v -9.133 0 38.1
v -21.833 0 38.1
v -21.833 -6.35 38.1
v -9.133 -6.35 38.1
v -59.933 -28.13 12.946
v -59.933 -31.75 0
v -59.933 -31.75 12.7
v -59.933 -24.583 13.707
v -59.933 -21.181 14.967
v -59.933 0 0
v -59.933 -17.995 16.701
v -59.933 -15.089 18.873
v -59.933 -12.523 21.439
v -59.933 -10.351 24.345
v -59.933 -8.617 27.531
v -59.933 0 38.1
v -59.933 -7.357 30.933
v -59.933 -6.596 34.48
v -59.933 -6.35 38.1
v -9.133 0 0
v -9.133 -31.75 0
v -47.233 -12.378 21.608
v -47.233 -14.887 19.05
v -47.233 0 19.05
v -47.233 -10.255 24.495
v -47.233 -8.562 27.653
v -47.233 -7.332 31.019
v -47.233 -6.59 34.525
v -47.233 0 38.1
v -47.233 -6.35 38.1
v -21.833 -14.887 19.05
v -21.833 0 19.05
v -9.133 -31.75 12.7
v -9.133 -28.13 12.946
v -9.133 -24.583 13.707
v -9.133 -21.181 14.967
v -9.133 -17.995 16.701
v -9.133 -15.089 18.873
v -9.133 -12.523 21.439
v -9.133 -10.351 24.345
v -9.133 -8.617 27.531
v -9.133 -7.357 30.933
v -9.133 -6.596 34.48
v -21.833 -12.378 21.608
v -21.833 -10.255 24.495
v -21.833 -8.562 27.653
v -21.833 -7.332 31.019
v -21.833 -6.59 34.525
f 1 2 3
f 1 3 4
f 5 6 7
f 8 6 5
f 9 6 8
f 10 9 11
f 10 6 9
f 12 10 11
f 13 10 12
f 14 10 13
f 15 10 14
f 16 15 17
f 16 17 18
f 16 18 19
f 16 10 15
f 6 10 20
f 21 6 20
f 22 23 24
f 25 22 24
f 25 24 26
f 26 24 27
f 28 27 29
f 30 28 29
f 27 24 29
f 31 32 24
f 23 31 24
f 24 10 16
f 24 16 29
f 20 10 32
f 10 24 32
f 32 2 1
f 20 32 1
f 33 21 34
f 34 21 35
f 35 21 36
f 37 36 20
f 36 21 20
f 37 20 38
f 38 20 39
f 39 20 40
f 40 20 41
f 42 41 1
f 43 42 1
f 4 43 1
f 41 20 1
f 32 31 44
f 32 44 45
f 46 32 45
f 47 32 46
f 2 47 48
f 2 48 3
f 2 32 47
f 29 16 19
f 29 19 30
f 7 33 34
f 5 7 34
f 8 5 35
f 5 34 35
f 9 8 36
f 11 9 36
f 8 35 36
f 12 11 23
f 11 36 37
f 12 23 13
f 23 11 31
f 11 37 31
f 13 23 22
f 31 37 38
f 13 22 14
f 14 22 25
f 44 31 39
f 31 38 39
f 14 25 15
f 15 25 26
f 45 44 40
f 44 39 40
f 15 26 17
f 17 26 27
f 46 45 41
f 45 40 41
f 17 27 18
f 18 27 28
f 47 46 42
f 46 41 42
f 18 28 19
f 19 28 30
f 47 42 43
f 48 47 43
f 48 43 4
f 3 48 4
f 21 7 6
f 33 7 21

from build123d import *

# Parameters (mm, degrees)
F0_W     = 50.8
F0_H     = 38.1
F1_DEPTH = 31.75
F3_DEPTH = 50.8
F4_W     = 25.4
F4_H     = 19.05
F5_DEPTH = 50.8


with BuildPart() as f1:
    # F0 (on Front) → F1 (new body)
    with BuildSketch(Plane.XZ):
        with Locations((-34.532589, 19.05)):
            Rectangle(F0_W, F0_H)
    extrude(amount=F1_DEPTH)

    # F2 (on face) → F3 (cut)
    with BuildSketch(Plane.YZ.offset(-9.132589)):
        with BuildLine():
            Line((-31.75, 38.1), (-31.75, 12.7))
            ThreePointArc((-31.75, 12.7), (-13.759905, 20.109905), (-6.35, 38.1))
            Line((-6.35, 38.1), (-31.75, 38.1))
        make_face()
    extrude(amount=-F3_DEPTH, mode=Mode.SUBTRACT)

    # F4 (on face) → F5 (cut)
    with BuildSketch(Plane(origin=(0, 0, 0), x_dir=(-1, 0, 0), z_dir=(0, 1, 0))):
        with Locations((34.532589, 28.575)):
            Rectangle(F4_W, F4_H)
    extrude(amount=-F5_DEPTH, mode=Mode.SUBTRACT)


solid = f1.part
